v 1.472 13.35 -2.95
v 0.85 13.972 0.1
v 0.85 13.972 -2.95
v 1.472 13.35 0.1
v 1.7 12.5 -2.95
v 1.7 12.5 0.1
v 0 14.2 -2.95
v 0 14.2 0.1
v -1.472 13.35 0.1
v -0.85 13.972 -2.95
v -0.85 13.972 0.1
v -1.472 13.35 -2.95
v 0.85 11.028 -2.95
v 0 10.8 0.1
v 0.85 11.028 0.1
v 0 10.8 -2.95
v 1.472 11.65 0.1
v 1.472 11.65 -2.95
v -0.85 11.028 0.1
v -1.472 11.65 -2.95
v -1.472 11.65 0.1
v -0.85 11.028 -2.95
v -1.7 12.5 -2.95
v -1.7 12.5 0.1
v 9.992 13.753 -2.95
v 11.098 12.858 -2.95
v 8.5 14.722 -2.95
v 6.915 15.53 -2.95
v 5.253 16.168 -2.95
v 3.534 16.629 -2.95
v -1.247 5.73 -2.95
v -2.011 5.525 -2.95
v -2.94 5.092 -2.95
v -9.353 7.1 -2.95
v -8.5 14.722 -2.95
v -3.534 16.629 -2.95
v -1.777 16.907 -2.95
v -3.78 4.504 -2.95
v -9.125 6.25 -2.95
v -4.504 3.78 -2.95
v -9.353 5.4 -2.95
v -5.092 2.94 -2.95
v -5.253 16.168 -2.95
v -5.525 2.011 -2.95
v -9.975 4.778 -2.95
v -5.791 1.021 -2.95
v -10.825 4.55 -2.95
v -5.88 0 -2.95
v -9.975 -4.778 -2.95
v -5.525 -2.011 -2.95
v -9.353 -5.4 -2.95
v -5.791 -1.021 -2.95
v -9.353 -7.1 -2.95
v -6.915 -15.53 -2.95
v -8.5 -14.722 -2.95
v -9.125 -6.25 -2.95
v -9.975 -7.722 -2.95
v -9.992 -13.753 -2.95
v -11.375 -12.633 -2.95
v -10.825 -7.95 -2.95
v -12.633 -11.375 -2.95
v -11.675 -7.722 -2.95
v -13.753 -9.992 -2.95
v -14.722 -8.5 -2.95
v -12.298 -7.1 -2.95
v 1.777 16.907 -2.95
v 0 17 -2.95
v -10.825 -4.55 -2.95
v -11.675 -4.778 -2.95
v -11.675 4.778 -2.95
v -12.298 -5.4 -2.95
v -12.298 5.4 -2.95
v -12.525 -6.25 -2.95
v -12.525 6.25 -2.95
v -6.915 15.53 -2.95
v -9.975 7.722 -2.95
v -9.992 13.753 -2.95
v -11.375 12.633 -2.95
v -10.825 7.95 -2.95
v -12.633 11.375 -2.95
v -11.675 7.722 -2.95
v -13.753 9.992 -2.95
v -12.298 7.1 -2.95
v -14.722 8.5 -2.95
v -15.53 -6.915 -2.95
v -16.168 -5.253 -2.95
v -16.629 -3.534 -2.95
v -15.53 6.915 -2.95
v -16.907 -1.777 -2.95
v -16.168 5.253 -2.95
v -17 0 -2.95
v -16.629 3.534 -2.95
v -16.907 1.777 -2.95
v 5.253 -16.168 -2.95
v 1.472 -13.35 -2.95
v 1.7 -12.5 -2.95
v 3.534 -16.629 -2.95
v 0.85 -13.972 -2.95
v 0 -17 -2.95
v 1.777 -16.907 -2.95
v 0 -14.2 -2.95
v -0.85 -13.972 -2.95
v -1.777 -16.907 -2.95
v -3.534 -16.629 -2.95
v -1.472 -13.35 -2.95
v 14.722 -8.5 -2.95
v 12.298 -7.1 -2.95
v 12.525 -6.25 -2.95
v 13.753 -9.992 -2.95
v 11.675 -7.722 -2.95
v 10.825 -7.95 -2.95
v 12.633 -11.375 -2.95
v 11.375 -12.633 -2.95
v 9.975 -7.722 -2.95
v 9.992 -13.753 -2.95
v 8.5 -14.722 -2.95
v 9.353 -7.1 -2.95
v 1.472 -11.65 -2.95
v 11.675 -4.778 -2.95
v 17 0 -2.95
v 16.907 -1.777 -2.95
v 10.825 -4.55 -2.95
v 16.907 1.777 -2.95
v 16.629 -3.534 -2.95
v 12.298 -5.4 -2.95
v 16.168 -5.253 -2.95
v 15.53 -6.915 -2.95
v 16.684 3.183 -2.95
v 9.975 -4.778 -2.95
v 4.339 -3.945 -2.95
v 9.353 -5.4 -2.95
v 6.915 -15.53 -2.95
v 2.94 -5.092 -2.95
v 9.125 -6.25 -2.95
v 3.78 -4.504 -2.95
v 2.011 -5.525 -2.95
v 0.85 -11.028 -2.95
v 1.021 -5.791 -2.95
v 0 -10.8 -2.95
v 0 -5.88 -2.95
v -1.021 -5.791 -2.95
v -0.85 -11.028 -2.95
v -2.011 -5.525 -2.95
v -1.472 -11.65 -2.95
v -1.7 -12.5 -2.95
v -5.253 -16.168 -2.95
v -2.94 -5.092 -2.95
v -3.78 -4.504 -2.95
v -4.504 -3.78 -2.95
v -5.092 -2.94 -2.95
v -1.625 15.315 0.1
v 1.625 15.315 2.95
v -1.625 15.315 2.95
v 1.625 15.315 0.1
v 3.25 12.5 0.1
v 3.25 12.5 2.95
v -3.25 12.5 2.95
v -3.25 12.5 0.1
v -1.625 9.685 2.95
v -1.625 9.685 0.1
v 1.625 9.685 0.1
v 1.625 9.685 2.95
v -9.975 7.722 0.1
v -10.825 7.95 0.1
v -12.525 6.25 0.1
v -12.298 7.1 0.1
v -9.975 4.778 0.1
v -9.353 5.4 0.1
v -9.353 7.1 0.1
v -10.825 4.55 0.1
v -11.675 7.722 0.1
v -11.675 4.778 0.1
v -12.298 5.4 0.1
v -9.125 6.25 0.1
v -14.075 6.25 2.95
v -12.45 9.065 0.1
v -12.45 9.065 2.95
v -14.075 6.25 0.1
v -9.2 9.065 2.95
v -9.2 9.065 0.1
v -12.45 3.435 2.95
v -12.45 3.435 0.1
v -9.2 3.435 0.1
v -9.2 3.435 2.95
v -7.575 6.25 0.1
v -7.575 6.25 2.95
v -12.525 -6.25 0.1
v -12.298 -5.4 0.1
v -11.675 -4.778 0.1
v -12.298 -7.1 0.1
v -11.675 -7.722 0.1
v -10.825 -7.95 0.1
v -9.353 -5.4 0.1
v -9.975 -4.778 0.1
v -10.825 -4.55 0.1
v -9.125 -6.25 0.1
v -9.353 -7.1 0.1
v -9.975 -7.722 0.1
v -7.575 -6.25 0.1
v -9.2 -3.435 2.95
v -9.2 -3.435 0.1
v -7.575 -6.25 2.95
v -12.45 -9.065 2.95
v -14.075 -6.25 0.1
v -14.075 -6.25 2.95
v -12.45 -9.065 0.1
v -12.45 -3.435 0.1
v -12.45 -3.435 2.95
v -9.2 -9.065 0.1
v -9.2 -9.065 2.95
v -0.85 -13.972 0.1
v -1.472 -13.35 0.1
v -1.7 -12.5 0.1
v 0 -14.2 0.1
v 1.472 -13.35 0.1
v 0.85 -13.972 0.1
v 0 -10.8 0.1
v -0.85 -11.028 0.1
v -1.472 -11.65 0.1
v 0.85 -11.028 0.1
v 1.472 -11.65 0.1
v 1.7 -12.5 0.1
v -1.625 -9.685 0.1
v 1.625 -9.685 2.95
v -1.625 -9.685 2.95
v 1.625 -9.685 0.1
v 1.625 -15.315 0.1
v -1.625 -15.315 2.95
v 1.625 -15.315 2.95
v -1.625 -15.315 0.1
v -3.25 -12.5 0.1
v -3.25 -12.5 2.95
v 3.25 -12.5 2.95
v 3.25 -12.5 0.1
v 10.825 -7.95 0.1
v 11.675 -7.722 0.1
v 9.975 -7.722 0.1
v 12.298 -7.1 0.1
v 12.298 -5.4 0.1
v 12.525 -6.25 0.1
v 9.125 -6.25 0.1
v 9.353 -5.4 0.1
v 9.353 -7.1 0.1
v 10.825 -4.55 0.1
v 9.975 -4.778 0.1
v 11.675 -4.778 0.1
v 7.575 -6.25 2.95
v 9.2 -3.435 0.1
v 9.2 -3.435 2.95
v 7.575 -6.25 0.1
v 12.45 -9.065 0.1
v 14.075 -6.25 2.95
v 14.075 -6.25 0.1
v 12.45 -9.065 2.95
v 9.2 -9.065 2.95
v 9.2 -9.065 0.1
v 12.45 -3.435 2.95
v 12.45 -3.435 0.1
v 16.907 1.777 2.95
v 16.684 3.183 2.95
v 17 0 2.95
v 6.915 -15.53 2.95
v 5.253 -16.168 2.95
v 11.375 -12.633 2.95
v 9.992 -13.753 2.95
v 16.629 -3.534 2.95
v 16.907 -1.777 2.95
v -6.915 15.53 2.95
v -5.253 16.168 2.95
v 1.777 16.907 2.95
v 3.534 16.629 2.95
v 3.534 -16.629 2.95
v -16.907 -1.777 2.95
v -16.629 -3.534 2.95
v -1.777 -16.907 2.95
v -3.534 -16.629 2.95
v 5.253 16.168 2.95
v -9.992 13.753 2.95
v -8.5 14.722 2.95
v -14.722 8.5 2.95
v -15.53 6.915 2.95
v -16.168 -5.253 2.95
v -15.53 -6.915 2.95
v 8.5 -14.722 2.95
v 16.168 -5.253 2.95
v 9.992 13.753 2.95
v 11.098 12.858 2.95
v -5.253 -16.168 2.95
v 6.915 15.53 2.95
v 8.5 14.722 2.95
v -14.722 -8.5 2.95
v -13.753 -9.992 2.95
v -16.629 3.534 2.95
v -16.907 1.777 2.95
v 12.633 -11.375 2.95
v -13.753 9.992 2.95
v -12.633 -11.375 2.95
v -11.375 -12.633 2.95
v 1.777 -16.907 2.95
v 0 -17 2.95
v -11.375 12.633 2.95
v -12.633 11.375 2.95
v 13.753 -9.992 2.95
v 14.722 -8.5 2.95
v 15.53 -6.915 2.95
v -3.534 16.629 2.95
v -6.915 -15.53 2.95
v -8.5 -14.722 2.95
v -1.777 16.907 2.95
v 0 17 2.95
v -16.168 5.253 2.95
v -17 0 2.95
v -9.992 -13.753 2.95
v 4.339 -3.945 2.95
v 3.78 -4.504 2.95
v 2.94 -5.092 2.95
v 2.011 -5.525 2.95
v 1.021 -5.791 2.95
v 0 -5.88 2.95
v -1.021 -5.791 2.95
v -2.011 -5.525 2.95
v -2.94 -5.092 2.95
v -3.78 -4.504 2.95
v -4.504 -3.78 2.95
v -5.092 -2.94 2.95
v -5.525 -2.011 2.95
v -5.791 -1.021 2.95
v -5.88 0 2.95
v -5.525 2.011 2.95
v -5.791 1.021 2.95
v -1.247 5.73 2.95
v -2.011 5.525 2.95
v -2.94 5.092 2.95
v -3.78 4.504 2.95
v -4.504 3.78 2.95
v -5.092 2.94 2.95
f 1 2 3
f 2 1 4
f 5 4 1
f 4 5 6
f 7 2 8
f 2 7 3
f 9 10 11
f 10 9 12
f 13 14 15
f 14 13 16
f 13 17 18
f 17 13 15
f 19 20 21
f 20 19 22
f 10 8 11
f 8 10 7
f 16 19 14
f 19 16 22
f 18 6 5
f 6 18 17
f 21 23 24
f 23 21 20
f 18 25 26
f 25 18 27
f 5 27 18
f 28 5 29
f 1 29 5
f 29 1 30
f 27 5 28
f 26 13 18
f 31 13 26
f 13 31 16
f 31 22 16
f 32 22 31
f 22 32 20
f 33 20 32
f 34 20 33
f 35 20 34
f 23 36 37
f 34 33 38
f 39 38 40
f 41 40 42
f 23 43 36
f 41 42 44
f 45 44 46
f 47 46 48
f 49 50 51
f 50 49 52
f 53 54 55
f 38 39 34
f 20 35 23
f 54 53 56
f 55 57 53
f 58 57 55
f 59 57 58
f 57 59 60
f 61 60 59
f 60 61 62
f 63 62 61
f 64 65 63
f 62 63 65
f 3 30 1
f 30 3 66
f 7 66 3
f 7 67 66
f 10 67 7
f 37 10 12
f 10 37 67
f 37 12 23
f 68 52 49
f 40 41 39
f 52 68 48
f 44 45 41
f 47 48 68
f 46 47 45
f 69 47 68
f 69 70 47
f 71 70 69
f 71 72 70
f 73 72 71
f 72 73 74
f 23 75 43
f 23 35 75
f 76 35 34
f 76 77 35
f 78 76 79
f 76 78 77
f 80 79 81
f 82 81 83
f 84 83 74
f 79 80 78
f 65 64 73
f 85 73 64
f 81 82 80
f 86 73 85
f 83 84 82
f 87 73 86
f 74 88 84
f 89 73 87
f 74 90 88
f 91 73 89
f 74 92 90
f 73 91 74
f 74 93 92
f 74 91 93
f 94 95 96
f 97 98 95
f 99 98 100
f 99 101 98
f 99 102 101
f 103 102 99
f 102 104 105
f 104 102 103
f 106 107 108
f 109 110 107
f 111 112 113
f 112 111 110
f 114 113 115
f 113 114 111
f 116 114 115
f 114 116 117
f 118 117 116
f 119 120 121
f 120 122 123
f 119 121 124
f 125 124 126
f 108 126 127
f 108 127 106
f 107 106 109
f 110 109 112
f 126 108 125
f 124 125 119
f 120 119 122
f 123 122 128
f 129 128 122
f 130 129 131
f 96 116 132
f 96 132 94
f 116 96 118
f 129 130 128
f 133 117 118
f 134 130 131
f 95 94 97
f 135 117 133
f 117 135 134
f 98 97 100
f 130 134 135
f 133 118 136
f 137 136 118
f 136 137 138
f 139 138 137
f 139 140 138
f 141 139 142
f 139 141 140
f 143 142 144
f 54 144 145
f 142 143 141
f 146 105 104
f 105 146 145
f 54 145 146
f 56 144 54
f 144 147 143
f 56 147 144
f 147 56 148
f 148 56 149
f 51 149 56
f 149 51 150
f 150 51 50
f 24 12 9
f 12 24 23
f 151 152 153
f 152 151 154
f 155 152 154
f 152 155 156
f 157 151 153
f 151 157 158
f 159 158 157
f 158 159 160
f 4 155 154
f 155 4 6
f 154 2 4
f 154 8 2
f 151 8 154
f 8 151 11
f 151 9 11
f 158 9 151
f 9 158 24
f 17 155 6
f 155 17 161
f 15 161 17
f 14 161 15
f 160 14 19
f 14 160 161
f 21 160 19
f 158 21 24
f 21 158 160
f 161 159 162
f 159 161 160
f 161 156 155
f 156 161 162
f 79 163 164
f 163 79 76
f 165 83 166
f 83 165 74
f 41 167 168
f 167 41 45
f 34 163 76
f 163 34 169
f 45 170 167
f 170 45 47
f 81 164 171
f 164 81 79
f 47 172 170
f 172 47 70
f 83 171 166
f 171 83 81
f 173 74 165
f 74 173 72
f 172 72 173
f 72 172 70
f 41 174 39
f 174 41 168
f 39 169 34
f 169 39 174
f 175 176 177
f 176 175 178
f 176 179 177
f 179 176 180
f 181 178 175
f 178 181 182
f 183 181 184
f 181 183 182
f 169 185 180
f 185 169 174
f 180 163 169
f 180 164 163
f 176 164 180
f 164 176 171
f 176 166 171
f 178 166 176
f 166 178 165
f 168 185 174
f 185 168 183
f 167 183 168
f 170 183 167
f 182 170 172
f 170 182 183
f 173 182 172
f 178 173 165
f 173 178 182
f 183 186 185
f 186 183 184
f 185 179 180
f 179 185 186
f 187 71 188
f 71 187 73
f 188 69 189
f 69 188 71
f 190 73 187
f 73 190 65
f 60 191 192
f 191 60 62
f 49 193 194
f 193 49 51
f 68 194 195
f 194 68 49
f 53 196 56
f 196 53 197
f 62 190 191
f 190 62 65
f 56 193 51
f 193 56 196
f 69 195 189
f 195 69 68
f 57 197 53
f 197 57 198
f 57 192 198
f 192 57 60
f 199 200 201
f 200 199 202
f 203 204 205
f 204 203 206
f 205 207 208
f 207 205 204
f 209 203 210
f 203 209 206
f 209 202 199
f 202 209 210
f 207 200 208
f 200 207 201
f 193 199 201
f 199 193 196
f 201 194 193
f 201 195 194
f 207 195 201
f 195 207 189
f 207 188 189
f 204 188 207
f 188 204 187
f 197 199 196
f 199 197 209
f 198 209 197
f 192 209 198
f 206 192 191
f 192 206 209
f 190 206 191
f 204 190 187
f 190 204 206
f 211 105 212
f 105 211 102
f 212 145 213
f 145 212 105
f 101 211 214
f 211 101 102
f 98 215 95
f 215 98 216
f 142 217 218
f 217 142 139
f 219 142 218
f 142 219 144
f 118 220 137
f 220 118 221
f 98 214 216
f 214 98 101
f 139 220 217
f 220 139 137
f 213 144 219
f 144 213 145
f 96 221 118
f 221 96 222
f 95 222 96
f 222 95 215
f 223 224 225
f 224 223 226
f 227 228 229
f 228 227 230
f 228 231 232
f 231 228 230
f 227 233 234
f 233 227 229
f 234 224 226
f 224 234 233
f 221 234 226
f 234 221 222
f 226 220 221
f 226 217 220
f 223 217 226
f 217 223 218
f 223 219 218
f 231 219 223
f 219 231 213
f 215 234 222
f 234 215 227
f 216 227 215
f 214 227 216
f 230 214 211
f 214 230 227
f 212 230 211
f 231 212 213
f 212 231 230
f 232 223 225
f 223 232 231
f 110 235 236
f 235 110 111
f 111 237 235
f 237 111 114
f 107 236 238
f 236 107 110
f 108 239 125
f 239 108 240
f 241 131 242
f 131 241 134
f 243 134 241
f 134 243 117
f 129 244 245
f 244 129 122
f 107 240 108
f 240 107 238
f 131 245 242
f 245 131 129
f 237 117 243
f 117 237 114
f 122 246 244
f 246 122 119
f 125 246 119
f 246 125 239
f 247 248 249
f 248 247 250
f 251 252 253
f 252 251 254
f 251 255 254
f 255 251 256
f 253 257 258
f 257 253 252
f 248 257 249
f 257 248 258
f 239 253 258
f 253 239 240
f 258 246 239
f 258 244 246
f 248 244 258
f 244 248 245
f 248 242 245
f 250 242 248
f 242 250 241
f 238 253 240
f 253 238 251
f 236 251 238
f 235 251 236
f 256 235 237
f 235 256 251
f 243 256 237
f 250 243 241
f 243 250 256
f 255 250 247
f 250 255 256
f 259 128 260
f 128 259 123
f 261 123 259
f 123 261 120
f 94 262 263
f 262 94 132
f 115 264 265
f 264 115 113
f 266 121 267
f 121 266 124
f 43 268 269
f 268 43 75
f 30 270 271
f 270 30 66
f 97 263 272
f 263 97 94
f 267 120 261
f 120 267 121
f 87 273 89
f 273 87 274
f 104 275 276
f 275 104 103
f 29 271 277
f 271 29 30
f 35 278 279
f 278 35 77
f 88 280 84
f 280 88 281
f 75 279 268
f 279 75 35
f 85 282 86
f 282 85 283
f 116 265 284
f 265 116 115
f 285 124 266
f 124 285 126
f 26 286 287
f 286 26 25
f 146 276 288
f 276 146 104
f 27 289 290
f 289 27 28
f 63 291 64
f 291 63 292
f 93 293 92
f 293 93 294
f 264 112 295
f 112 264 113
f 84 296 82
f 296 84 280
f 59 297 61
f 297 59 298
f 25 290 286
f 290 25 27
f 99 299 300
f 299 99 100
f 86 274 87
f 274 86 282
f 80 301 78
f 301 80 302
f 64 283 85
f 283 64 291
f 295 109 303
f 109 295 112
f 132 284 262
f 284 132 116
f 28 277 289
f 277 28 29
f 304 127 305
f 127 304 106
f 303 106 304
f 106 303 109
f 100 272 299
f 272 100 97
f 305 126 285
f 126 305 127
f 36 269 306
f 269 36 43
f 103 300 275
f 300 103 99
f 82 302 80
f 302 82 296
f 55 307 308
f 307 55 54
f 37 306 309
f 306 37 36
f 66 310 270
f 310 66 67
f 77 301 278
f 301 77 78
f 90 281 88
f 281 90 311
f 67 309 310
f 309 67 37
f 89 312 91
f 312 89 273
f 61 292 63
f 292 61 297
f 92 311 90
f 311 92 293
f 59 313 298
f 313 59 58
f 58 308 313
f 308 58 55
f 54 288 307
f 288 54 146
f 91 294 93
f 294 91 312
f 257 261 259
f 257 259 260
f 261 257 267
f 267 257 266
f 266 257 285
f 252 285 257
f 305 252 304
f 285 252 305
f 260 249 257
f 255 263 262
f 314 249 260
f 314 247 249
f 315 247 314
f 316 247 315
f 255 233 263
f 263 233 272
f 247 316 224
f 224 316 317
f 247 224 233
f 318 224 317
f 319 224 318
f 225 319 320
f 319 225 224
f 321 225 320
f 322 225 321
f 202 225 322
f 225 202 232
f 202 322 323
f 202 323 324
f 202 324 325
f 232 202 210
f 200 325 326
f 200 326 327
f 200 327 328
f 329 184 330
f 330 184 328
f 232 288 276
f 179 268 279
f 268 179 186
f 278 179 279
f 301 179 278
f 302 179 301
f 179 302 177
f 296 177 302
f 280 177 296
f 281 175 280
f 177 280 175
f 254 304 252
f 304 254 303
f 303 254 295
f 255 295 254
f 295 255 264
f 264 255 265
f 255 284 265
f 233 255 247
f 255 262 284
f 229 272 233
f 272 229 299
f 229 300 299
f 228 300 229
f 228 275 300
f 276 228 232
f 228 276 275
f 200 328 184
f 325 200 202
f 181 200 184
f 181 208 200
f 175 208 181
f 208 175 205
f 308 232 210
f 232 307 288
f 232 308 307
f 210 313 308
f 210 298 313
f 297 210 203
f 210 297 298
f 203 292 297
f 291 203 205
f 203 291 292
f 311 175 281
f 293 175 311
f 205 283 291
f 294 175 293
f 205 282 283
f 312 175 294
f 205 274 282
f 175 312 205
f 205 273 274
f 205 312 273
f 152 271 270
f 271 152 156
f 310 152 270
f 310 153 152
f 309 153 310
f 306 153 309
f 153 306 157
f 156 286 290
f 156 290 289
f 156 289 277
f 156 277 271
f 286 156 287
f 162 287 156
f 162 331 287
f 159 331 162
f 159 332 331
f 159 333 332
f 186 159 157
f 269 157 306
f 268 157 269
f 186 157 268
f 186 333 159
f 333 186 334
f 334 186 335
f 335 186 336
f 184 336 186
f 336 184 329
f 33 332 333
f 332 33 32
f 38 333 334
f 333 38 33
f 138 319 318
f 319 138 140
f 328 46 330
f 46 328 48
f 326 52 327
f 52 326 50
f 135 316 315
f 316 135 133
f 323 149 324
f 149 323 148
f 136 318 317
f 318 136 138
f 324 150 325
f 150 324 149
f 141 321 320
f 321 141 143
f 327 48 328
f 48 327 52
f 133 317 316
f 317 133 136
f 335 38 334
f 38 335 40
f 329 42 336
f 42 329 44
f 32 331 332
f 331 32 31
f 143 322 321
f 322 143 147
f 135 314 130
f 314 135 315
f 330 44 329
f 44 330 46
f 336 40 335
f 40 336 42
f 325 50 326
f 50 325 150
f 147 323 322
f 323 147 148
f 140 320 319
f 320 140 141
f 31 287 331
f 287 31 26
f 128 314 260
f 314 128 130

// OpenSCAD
// file: configuration.scad
// Increase this if your slicer or printer make holes too tight.
extra_radius = 0; // 0.1;

// OD = outside diameter, corner to corner.
m3_nut_od = 6.1;
m3_nut_radius = m3_nut_od/2 + 0.2 + extra_radius;
m3_nut_h = 2.4;
m3_nyloc_h = 3.9;
m3_washer_radius = 3.5 + extra_radius;

m4_nut_od = 7.8;
m4_nut_radius = m4_nut_od/2 + 0.2 + extra_radius;
m4_washer_radius = 4.4 + extra_radius;

// Major diameter of metric 3mm thread.
m3_major = 3;
m3_radius = m3_major/2 + extra_radius;
m3_wide_radius = m3_major/2 + extra_radius + 0.2;

// Major diameter of metric 4mm thread.
m4_major = 4;
m4_radius = m4_major/2 + extra_radius;
m4_wide_radius = m4_major/2 + extra_radius + 0.2;

// M6 Radius
m6_radius = 6/2;

// No4 Self Tapper pilot hole radius
no4_pilot_radius = 2.35/2;

// NEMA17 stepper motors.
motor_shaft_diameter = 5;
motor_shaft_radius = motor_shaft_diameter/2 + extra_radius;

// Frame brackets. M3x8mm screws work best with 3.6 mm brackets.
thickness = 4.0; //3.6 on 1515

// OpenBeam or Misumi. Currently only 15x15 mm, but there is a plan
// to make models more parametric and allow 20x20 mm in the future.
extrusion = 20;

// Placement for the NEMA17 stepper motors.
motor_offset = 44;
motor_length = 47;

separation = 38;  // Distance between ball joint mounting faces.

extrusion_fin_d = 1;

vertex_radius = 40.5; //set to 36 for 1515
vertex_x_offset = 7.25; // offset of the horizontal extrusion to the vertical one in X axis
vertex_y_offset = 39 ;//27; // offset of the horizontal extrusion to the vertical one in Y axis
// main file
include <configuration.scad>;

mount_radius = 12.5;  // Hotend mounting screws, standard would be 25mm.
hotend_radius = 8;  // Hole for the hotend (J-Head diameter is 16mm).
//hotend_recess = 4.7;  // How much to sink the hotend into the effector
hotend_inner_radius = 5.88;  // Rim around it stops the hotend moving upwards
height = 5.9; // Height of slot in hotend

module effector() {
  difference() {
    union() {
      cylinder(r=mount_radius + mount_radius - hotend_radius, h=height, center=true, $fn=60);
      for (a = [60:120:359]) rotate([0, 0, a]) {
      }
    }
    // Hole to clip into hote end
    translate([0, 0, -height/2])
      cylinder(r=hotend_inner_radius, h=height, $fn=36);
    
    // Mounting holes and nut traps
    for (a = [0:60:359]) rotate([0, 0, a])
    {
        translate([0, mount_radius, 0])
            cylinder(r=m3_wide_radius, h=height, center=true, $fn=12);
        translate([0, mount_radius,thickness-m3_nyloc_h])
			cylinder(r=m3_nut_radius,h=m3_nyloc_h+1,$fn=6);
               
    }
  }
}

difference()
{
    effector();
    rotate([0,0,30])
        translate([(mount_radius + mount_radius - hotend_radius)/2,0,0])
            cube([mount_radius + mount_radius - hotend_radius,(hotend_inner_radius*2)*.95,height],center=true);
    
}
//translate([0, 0, height/2]) effector();
